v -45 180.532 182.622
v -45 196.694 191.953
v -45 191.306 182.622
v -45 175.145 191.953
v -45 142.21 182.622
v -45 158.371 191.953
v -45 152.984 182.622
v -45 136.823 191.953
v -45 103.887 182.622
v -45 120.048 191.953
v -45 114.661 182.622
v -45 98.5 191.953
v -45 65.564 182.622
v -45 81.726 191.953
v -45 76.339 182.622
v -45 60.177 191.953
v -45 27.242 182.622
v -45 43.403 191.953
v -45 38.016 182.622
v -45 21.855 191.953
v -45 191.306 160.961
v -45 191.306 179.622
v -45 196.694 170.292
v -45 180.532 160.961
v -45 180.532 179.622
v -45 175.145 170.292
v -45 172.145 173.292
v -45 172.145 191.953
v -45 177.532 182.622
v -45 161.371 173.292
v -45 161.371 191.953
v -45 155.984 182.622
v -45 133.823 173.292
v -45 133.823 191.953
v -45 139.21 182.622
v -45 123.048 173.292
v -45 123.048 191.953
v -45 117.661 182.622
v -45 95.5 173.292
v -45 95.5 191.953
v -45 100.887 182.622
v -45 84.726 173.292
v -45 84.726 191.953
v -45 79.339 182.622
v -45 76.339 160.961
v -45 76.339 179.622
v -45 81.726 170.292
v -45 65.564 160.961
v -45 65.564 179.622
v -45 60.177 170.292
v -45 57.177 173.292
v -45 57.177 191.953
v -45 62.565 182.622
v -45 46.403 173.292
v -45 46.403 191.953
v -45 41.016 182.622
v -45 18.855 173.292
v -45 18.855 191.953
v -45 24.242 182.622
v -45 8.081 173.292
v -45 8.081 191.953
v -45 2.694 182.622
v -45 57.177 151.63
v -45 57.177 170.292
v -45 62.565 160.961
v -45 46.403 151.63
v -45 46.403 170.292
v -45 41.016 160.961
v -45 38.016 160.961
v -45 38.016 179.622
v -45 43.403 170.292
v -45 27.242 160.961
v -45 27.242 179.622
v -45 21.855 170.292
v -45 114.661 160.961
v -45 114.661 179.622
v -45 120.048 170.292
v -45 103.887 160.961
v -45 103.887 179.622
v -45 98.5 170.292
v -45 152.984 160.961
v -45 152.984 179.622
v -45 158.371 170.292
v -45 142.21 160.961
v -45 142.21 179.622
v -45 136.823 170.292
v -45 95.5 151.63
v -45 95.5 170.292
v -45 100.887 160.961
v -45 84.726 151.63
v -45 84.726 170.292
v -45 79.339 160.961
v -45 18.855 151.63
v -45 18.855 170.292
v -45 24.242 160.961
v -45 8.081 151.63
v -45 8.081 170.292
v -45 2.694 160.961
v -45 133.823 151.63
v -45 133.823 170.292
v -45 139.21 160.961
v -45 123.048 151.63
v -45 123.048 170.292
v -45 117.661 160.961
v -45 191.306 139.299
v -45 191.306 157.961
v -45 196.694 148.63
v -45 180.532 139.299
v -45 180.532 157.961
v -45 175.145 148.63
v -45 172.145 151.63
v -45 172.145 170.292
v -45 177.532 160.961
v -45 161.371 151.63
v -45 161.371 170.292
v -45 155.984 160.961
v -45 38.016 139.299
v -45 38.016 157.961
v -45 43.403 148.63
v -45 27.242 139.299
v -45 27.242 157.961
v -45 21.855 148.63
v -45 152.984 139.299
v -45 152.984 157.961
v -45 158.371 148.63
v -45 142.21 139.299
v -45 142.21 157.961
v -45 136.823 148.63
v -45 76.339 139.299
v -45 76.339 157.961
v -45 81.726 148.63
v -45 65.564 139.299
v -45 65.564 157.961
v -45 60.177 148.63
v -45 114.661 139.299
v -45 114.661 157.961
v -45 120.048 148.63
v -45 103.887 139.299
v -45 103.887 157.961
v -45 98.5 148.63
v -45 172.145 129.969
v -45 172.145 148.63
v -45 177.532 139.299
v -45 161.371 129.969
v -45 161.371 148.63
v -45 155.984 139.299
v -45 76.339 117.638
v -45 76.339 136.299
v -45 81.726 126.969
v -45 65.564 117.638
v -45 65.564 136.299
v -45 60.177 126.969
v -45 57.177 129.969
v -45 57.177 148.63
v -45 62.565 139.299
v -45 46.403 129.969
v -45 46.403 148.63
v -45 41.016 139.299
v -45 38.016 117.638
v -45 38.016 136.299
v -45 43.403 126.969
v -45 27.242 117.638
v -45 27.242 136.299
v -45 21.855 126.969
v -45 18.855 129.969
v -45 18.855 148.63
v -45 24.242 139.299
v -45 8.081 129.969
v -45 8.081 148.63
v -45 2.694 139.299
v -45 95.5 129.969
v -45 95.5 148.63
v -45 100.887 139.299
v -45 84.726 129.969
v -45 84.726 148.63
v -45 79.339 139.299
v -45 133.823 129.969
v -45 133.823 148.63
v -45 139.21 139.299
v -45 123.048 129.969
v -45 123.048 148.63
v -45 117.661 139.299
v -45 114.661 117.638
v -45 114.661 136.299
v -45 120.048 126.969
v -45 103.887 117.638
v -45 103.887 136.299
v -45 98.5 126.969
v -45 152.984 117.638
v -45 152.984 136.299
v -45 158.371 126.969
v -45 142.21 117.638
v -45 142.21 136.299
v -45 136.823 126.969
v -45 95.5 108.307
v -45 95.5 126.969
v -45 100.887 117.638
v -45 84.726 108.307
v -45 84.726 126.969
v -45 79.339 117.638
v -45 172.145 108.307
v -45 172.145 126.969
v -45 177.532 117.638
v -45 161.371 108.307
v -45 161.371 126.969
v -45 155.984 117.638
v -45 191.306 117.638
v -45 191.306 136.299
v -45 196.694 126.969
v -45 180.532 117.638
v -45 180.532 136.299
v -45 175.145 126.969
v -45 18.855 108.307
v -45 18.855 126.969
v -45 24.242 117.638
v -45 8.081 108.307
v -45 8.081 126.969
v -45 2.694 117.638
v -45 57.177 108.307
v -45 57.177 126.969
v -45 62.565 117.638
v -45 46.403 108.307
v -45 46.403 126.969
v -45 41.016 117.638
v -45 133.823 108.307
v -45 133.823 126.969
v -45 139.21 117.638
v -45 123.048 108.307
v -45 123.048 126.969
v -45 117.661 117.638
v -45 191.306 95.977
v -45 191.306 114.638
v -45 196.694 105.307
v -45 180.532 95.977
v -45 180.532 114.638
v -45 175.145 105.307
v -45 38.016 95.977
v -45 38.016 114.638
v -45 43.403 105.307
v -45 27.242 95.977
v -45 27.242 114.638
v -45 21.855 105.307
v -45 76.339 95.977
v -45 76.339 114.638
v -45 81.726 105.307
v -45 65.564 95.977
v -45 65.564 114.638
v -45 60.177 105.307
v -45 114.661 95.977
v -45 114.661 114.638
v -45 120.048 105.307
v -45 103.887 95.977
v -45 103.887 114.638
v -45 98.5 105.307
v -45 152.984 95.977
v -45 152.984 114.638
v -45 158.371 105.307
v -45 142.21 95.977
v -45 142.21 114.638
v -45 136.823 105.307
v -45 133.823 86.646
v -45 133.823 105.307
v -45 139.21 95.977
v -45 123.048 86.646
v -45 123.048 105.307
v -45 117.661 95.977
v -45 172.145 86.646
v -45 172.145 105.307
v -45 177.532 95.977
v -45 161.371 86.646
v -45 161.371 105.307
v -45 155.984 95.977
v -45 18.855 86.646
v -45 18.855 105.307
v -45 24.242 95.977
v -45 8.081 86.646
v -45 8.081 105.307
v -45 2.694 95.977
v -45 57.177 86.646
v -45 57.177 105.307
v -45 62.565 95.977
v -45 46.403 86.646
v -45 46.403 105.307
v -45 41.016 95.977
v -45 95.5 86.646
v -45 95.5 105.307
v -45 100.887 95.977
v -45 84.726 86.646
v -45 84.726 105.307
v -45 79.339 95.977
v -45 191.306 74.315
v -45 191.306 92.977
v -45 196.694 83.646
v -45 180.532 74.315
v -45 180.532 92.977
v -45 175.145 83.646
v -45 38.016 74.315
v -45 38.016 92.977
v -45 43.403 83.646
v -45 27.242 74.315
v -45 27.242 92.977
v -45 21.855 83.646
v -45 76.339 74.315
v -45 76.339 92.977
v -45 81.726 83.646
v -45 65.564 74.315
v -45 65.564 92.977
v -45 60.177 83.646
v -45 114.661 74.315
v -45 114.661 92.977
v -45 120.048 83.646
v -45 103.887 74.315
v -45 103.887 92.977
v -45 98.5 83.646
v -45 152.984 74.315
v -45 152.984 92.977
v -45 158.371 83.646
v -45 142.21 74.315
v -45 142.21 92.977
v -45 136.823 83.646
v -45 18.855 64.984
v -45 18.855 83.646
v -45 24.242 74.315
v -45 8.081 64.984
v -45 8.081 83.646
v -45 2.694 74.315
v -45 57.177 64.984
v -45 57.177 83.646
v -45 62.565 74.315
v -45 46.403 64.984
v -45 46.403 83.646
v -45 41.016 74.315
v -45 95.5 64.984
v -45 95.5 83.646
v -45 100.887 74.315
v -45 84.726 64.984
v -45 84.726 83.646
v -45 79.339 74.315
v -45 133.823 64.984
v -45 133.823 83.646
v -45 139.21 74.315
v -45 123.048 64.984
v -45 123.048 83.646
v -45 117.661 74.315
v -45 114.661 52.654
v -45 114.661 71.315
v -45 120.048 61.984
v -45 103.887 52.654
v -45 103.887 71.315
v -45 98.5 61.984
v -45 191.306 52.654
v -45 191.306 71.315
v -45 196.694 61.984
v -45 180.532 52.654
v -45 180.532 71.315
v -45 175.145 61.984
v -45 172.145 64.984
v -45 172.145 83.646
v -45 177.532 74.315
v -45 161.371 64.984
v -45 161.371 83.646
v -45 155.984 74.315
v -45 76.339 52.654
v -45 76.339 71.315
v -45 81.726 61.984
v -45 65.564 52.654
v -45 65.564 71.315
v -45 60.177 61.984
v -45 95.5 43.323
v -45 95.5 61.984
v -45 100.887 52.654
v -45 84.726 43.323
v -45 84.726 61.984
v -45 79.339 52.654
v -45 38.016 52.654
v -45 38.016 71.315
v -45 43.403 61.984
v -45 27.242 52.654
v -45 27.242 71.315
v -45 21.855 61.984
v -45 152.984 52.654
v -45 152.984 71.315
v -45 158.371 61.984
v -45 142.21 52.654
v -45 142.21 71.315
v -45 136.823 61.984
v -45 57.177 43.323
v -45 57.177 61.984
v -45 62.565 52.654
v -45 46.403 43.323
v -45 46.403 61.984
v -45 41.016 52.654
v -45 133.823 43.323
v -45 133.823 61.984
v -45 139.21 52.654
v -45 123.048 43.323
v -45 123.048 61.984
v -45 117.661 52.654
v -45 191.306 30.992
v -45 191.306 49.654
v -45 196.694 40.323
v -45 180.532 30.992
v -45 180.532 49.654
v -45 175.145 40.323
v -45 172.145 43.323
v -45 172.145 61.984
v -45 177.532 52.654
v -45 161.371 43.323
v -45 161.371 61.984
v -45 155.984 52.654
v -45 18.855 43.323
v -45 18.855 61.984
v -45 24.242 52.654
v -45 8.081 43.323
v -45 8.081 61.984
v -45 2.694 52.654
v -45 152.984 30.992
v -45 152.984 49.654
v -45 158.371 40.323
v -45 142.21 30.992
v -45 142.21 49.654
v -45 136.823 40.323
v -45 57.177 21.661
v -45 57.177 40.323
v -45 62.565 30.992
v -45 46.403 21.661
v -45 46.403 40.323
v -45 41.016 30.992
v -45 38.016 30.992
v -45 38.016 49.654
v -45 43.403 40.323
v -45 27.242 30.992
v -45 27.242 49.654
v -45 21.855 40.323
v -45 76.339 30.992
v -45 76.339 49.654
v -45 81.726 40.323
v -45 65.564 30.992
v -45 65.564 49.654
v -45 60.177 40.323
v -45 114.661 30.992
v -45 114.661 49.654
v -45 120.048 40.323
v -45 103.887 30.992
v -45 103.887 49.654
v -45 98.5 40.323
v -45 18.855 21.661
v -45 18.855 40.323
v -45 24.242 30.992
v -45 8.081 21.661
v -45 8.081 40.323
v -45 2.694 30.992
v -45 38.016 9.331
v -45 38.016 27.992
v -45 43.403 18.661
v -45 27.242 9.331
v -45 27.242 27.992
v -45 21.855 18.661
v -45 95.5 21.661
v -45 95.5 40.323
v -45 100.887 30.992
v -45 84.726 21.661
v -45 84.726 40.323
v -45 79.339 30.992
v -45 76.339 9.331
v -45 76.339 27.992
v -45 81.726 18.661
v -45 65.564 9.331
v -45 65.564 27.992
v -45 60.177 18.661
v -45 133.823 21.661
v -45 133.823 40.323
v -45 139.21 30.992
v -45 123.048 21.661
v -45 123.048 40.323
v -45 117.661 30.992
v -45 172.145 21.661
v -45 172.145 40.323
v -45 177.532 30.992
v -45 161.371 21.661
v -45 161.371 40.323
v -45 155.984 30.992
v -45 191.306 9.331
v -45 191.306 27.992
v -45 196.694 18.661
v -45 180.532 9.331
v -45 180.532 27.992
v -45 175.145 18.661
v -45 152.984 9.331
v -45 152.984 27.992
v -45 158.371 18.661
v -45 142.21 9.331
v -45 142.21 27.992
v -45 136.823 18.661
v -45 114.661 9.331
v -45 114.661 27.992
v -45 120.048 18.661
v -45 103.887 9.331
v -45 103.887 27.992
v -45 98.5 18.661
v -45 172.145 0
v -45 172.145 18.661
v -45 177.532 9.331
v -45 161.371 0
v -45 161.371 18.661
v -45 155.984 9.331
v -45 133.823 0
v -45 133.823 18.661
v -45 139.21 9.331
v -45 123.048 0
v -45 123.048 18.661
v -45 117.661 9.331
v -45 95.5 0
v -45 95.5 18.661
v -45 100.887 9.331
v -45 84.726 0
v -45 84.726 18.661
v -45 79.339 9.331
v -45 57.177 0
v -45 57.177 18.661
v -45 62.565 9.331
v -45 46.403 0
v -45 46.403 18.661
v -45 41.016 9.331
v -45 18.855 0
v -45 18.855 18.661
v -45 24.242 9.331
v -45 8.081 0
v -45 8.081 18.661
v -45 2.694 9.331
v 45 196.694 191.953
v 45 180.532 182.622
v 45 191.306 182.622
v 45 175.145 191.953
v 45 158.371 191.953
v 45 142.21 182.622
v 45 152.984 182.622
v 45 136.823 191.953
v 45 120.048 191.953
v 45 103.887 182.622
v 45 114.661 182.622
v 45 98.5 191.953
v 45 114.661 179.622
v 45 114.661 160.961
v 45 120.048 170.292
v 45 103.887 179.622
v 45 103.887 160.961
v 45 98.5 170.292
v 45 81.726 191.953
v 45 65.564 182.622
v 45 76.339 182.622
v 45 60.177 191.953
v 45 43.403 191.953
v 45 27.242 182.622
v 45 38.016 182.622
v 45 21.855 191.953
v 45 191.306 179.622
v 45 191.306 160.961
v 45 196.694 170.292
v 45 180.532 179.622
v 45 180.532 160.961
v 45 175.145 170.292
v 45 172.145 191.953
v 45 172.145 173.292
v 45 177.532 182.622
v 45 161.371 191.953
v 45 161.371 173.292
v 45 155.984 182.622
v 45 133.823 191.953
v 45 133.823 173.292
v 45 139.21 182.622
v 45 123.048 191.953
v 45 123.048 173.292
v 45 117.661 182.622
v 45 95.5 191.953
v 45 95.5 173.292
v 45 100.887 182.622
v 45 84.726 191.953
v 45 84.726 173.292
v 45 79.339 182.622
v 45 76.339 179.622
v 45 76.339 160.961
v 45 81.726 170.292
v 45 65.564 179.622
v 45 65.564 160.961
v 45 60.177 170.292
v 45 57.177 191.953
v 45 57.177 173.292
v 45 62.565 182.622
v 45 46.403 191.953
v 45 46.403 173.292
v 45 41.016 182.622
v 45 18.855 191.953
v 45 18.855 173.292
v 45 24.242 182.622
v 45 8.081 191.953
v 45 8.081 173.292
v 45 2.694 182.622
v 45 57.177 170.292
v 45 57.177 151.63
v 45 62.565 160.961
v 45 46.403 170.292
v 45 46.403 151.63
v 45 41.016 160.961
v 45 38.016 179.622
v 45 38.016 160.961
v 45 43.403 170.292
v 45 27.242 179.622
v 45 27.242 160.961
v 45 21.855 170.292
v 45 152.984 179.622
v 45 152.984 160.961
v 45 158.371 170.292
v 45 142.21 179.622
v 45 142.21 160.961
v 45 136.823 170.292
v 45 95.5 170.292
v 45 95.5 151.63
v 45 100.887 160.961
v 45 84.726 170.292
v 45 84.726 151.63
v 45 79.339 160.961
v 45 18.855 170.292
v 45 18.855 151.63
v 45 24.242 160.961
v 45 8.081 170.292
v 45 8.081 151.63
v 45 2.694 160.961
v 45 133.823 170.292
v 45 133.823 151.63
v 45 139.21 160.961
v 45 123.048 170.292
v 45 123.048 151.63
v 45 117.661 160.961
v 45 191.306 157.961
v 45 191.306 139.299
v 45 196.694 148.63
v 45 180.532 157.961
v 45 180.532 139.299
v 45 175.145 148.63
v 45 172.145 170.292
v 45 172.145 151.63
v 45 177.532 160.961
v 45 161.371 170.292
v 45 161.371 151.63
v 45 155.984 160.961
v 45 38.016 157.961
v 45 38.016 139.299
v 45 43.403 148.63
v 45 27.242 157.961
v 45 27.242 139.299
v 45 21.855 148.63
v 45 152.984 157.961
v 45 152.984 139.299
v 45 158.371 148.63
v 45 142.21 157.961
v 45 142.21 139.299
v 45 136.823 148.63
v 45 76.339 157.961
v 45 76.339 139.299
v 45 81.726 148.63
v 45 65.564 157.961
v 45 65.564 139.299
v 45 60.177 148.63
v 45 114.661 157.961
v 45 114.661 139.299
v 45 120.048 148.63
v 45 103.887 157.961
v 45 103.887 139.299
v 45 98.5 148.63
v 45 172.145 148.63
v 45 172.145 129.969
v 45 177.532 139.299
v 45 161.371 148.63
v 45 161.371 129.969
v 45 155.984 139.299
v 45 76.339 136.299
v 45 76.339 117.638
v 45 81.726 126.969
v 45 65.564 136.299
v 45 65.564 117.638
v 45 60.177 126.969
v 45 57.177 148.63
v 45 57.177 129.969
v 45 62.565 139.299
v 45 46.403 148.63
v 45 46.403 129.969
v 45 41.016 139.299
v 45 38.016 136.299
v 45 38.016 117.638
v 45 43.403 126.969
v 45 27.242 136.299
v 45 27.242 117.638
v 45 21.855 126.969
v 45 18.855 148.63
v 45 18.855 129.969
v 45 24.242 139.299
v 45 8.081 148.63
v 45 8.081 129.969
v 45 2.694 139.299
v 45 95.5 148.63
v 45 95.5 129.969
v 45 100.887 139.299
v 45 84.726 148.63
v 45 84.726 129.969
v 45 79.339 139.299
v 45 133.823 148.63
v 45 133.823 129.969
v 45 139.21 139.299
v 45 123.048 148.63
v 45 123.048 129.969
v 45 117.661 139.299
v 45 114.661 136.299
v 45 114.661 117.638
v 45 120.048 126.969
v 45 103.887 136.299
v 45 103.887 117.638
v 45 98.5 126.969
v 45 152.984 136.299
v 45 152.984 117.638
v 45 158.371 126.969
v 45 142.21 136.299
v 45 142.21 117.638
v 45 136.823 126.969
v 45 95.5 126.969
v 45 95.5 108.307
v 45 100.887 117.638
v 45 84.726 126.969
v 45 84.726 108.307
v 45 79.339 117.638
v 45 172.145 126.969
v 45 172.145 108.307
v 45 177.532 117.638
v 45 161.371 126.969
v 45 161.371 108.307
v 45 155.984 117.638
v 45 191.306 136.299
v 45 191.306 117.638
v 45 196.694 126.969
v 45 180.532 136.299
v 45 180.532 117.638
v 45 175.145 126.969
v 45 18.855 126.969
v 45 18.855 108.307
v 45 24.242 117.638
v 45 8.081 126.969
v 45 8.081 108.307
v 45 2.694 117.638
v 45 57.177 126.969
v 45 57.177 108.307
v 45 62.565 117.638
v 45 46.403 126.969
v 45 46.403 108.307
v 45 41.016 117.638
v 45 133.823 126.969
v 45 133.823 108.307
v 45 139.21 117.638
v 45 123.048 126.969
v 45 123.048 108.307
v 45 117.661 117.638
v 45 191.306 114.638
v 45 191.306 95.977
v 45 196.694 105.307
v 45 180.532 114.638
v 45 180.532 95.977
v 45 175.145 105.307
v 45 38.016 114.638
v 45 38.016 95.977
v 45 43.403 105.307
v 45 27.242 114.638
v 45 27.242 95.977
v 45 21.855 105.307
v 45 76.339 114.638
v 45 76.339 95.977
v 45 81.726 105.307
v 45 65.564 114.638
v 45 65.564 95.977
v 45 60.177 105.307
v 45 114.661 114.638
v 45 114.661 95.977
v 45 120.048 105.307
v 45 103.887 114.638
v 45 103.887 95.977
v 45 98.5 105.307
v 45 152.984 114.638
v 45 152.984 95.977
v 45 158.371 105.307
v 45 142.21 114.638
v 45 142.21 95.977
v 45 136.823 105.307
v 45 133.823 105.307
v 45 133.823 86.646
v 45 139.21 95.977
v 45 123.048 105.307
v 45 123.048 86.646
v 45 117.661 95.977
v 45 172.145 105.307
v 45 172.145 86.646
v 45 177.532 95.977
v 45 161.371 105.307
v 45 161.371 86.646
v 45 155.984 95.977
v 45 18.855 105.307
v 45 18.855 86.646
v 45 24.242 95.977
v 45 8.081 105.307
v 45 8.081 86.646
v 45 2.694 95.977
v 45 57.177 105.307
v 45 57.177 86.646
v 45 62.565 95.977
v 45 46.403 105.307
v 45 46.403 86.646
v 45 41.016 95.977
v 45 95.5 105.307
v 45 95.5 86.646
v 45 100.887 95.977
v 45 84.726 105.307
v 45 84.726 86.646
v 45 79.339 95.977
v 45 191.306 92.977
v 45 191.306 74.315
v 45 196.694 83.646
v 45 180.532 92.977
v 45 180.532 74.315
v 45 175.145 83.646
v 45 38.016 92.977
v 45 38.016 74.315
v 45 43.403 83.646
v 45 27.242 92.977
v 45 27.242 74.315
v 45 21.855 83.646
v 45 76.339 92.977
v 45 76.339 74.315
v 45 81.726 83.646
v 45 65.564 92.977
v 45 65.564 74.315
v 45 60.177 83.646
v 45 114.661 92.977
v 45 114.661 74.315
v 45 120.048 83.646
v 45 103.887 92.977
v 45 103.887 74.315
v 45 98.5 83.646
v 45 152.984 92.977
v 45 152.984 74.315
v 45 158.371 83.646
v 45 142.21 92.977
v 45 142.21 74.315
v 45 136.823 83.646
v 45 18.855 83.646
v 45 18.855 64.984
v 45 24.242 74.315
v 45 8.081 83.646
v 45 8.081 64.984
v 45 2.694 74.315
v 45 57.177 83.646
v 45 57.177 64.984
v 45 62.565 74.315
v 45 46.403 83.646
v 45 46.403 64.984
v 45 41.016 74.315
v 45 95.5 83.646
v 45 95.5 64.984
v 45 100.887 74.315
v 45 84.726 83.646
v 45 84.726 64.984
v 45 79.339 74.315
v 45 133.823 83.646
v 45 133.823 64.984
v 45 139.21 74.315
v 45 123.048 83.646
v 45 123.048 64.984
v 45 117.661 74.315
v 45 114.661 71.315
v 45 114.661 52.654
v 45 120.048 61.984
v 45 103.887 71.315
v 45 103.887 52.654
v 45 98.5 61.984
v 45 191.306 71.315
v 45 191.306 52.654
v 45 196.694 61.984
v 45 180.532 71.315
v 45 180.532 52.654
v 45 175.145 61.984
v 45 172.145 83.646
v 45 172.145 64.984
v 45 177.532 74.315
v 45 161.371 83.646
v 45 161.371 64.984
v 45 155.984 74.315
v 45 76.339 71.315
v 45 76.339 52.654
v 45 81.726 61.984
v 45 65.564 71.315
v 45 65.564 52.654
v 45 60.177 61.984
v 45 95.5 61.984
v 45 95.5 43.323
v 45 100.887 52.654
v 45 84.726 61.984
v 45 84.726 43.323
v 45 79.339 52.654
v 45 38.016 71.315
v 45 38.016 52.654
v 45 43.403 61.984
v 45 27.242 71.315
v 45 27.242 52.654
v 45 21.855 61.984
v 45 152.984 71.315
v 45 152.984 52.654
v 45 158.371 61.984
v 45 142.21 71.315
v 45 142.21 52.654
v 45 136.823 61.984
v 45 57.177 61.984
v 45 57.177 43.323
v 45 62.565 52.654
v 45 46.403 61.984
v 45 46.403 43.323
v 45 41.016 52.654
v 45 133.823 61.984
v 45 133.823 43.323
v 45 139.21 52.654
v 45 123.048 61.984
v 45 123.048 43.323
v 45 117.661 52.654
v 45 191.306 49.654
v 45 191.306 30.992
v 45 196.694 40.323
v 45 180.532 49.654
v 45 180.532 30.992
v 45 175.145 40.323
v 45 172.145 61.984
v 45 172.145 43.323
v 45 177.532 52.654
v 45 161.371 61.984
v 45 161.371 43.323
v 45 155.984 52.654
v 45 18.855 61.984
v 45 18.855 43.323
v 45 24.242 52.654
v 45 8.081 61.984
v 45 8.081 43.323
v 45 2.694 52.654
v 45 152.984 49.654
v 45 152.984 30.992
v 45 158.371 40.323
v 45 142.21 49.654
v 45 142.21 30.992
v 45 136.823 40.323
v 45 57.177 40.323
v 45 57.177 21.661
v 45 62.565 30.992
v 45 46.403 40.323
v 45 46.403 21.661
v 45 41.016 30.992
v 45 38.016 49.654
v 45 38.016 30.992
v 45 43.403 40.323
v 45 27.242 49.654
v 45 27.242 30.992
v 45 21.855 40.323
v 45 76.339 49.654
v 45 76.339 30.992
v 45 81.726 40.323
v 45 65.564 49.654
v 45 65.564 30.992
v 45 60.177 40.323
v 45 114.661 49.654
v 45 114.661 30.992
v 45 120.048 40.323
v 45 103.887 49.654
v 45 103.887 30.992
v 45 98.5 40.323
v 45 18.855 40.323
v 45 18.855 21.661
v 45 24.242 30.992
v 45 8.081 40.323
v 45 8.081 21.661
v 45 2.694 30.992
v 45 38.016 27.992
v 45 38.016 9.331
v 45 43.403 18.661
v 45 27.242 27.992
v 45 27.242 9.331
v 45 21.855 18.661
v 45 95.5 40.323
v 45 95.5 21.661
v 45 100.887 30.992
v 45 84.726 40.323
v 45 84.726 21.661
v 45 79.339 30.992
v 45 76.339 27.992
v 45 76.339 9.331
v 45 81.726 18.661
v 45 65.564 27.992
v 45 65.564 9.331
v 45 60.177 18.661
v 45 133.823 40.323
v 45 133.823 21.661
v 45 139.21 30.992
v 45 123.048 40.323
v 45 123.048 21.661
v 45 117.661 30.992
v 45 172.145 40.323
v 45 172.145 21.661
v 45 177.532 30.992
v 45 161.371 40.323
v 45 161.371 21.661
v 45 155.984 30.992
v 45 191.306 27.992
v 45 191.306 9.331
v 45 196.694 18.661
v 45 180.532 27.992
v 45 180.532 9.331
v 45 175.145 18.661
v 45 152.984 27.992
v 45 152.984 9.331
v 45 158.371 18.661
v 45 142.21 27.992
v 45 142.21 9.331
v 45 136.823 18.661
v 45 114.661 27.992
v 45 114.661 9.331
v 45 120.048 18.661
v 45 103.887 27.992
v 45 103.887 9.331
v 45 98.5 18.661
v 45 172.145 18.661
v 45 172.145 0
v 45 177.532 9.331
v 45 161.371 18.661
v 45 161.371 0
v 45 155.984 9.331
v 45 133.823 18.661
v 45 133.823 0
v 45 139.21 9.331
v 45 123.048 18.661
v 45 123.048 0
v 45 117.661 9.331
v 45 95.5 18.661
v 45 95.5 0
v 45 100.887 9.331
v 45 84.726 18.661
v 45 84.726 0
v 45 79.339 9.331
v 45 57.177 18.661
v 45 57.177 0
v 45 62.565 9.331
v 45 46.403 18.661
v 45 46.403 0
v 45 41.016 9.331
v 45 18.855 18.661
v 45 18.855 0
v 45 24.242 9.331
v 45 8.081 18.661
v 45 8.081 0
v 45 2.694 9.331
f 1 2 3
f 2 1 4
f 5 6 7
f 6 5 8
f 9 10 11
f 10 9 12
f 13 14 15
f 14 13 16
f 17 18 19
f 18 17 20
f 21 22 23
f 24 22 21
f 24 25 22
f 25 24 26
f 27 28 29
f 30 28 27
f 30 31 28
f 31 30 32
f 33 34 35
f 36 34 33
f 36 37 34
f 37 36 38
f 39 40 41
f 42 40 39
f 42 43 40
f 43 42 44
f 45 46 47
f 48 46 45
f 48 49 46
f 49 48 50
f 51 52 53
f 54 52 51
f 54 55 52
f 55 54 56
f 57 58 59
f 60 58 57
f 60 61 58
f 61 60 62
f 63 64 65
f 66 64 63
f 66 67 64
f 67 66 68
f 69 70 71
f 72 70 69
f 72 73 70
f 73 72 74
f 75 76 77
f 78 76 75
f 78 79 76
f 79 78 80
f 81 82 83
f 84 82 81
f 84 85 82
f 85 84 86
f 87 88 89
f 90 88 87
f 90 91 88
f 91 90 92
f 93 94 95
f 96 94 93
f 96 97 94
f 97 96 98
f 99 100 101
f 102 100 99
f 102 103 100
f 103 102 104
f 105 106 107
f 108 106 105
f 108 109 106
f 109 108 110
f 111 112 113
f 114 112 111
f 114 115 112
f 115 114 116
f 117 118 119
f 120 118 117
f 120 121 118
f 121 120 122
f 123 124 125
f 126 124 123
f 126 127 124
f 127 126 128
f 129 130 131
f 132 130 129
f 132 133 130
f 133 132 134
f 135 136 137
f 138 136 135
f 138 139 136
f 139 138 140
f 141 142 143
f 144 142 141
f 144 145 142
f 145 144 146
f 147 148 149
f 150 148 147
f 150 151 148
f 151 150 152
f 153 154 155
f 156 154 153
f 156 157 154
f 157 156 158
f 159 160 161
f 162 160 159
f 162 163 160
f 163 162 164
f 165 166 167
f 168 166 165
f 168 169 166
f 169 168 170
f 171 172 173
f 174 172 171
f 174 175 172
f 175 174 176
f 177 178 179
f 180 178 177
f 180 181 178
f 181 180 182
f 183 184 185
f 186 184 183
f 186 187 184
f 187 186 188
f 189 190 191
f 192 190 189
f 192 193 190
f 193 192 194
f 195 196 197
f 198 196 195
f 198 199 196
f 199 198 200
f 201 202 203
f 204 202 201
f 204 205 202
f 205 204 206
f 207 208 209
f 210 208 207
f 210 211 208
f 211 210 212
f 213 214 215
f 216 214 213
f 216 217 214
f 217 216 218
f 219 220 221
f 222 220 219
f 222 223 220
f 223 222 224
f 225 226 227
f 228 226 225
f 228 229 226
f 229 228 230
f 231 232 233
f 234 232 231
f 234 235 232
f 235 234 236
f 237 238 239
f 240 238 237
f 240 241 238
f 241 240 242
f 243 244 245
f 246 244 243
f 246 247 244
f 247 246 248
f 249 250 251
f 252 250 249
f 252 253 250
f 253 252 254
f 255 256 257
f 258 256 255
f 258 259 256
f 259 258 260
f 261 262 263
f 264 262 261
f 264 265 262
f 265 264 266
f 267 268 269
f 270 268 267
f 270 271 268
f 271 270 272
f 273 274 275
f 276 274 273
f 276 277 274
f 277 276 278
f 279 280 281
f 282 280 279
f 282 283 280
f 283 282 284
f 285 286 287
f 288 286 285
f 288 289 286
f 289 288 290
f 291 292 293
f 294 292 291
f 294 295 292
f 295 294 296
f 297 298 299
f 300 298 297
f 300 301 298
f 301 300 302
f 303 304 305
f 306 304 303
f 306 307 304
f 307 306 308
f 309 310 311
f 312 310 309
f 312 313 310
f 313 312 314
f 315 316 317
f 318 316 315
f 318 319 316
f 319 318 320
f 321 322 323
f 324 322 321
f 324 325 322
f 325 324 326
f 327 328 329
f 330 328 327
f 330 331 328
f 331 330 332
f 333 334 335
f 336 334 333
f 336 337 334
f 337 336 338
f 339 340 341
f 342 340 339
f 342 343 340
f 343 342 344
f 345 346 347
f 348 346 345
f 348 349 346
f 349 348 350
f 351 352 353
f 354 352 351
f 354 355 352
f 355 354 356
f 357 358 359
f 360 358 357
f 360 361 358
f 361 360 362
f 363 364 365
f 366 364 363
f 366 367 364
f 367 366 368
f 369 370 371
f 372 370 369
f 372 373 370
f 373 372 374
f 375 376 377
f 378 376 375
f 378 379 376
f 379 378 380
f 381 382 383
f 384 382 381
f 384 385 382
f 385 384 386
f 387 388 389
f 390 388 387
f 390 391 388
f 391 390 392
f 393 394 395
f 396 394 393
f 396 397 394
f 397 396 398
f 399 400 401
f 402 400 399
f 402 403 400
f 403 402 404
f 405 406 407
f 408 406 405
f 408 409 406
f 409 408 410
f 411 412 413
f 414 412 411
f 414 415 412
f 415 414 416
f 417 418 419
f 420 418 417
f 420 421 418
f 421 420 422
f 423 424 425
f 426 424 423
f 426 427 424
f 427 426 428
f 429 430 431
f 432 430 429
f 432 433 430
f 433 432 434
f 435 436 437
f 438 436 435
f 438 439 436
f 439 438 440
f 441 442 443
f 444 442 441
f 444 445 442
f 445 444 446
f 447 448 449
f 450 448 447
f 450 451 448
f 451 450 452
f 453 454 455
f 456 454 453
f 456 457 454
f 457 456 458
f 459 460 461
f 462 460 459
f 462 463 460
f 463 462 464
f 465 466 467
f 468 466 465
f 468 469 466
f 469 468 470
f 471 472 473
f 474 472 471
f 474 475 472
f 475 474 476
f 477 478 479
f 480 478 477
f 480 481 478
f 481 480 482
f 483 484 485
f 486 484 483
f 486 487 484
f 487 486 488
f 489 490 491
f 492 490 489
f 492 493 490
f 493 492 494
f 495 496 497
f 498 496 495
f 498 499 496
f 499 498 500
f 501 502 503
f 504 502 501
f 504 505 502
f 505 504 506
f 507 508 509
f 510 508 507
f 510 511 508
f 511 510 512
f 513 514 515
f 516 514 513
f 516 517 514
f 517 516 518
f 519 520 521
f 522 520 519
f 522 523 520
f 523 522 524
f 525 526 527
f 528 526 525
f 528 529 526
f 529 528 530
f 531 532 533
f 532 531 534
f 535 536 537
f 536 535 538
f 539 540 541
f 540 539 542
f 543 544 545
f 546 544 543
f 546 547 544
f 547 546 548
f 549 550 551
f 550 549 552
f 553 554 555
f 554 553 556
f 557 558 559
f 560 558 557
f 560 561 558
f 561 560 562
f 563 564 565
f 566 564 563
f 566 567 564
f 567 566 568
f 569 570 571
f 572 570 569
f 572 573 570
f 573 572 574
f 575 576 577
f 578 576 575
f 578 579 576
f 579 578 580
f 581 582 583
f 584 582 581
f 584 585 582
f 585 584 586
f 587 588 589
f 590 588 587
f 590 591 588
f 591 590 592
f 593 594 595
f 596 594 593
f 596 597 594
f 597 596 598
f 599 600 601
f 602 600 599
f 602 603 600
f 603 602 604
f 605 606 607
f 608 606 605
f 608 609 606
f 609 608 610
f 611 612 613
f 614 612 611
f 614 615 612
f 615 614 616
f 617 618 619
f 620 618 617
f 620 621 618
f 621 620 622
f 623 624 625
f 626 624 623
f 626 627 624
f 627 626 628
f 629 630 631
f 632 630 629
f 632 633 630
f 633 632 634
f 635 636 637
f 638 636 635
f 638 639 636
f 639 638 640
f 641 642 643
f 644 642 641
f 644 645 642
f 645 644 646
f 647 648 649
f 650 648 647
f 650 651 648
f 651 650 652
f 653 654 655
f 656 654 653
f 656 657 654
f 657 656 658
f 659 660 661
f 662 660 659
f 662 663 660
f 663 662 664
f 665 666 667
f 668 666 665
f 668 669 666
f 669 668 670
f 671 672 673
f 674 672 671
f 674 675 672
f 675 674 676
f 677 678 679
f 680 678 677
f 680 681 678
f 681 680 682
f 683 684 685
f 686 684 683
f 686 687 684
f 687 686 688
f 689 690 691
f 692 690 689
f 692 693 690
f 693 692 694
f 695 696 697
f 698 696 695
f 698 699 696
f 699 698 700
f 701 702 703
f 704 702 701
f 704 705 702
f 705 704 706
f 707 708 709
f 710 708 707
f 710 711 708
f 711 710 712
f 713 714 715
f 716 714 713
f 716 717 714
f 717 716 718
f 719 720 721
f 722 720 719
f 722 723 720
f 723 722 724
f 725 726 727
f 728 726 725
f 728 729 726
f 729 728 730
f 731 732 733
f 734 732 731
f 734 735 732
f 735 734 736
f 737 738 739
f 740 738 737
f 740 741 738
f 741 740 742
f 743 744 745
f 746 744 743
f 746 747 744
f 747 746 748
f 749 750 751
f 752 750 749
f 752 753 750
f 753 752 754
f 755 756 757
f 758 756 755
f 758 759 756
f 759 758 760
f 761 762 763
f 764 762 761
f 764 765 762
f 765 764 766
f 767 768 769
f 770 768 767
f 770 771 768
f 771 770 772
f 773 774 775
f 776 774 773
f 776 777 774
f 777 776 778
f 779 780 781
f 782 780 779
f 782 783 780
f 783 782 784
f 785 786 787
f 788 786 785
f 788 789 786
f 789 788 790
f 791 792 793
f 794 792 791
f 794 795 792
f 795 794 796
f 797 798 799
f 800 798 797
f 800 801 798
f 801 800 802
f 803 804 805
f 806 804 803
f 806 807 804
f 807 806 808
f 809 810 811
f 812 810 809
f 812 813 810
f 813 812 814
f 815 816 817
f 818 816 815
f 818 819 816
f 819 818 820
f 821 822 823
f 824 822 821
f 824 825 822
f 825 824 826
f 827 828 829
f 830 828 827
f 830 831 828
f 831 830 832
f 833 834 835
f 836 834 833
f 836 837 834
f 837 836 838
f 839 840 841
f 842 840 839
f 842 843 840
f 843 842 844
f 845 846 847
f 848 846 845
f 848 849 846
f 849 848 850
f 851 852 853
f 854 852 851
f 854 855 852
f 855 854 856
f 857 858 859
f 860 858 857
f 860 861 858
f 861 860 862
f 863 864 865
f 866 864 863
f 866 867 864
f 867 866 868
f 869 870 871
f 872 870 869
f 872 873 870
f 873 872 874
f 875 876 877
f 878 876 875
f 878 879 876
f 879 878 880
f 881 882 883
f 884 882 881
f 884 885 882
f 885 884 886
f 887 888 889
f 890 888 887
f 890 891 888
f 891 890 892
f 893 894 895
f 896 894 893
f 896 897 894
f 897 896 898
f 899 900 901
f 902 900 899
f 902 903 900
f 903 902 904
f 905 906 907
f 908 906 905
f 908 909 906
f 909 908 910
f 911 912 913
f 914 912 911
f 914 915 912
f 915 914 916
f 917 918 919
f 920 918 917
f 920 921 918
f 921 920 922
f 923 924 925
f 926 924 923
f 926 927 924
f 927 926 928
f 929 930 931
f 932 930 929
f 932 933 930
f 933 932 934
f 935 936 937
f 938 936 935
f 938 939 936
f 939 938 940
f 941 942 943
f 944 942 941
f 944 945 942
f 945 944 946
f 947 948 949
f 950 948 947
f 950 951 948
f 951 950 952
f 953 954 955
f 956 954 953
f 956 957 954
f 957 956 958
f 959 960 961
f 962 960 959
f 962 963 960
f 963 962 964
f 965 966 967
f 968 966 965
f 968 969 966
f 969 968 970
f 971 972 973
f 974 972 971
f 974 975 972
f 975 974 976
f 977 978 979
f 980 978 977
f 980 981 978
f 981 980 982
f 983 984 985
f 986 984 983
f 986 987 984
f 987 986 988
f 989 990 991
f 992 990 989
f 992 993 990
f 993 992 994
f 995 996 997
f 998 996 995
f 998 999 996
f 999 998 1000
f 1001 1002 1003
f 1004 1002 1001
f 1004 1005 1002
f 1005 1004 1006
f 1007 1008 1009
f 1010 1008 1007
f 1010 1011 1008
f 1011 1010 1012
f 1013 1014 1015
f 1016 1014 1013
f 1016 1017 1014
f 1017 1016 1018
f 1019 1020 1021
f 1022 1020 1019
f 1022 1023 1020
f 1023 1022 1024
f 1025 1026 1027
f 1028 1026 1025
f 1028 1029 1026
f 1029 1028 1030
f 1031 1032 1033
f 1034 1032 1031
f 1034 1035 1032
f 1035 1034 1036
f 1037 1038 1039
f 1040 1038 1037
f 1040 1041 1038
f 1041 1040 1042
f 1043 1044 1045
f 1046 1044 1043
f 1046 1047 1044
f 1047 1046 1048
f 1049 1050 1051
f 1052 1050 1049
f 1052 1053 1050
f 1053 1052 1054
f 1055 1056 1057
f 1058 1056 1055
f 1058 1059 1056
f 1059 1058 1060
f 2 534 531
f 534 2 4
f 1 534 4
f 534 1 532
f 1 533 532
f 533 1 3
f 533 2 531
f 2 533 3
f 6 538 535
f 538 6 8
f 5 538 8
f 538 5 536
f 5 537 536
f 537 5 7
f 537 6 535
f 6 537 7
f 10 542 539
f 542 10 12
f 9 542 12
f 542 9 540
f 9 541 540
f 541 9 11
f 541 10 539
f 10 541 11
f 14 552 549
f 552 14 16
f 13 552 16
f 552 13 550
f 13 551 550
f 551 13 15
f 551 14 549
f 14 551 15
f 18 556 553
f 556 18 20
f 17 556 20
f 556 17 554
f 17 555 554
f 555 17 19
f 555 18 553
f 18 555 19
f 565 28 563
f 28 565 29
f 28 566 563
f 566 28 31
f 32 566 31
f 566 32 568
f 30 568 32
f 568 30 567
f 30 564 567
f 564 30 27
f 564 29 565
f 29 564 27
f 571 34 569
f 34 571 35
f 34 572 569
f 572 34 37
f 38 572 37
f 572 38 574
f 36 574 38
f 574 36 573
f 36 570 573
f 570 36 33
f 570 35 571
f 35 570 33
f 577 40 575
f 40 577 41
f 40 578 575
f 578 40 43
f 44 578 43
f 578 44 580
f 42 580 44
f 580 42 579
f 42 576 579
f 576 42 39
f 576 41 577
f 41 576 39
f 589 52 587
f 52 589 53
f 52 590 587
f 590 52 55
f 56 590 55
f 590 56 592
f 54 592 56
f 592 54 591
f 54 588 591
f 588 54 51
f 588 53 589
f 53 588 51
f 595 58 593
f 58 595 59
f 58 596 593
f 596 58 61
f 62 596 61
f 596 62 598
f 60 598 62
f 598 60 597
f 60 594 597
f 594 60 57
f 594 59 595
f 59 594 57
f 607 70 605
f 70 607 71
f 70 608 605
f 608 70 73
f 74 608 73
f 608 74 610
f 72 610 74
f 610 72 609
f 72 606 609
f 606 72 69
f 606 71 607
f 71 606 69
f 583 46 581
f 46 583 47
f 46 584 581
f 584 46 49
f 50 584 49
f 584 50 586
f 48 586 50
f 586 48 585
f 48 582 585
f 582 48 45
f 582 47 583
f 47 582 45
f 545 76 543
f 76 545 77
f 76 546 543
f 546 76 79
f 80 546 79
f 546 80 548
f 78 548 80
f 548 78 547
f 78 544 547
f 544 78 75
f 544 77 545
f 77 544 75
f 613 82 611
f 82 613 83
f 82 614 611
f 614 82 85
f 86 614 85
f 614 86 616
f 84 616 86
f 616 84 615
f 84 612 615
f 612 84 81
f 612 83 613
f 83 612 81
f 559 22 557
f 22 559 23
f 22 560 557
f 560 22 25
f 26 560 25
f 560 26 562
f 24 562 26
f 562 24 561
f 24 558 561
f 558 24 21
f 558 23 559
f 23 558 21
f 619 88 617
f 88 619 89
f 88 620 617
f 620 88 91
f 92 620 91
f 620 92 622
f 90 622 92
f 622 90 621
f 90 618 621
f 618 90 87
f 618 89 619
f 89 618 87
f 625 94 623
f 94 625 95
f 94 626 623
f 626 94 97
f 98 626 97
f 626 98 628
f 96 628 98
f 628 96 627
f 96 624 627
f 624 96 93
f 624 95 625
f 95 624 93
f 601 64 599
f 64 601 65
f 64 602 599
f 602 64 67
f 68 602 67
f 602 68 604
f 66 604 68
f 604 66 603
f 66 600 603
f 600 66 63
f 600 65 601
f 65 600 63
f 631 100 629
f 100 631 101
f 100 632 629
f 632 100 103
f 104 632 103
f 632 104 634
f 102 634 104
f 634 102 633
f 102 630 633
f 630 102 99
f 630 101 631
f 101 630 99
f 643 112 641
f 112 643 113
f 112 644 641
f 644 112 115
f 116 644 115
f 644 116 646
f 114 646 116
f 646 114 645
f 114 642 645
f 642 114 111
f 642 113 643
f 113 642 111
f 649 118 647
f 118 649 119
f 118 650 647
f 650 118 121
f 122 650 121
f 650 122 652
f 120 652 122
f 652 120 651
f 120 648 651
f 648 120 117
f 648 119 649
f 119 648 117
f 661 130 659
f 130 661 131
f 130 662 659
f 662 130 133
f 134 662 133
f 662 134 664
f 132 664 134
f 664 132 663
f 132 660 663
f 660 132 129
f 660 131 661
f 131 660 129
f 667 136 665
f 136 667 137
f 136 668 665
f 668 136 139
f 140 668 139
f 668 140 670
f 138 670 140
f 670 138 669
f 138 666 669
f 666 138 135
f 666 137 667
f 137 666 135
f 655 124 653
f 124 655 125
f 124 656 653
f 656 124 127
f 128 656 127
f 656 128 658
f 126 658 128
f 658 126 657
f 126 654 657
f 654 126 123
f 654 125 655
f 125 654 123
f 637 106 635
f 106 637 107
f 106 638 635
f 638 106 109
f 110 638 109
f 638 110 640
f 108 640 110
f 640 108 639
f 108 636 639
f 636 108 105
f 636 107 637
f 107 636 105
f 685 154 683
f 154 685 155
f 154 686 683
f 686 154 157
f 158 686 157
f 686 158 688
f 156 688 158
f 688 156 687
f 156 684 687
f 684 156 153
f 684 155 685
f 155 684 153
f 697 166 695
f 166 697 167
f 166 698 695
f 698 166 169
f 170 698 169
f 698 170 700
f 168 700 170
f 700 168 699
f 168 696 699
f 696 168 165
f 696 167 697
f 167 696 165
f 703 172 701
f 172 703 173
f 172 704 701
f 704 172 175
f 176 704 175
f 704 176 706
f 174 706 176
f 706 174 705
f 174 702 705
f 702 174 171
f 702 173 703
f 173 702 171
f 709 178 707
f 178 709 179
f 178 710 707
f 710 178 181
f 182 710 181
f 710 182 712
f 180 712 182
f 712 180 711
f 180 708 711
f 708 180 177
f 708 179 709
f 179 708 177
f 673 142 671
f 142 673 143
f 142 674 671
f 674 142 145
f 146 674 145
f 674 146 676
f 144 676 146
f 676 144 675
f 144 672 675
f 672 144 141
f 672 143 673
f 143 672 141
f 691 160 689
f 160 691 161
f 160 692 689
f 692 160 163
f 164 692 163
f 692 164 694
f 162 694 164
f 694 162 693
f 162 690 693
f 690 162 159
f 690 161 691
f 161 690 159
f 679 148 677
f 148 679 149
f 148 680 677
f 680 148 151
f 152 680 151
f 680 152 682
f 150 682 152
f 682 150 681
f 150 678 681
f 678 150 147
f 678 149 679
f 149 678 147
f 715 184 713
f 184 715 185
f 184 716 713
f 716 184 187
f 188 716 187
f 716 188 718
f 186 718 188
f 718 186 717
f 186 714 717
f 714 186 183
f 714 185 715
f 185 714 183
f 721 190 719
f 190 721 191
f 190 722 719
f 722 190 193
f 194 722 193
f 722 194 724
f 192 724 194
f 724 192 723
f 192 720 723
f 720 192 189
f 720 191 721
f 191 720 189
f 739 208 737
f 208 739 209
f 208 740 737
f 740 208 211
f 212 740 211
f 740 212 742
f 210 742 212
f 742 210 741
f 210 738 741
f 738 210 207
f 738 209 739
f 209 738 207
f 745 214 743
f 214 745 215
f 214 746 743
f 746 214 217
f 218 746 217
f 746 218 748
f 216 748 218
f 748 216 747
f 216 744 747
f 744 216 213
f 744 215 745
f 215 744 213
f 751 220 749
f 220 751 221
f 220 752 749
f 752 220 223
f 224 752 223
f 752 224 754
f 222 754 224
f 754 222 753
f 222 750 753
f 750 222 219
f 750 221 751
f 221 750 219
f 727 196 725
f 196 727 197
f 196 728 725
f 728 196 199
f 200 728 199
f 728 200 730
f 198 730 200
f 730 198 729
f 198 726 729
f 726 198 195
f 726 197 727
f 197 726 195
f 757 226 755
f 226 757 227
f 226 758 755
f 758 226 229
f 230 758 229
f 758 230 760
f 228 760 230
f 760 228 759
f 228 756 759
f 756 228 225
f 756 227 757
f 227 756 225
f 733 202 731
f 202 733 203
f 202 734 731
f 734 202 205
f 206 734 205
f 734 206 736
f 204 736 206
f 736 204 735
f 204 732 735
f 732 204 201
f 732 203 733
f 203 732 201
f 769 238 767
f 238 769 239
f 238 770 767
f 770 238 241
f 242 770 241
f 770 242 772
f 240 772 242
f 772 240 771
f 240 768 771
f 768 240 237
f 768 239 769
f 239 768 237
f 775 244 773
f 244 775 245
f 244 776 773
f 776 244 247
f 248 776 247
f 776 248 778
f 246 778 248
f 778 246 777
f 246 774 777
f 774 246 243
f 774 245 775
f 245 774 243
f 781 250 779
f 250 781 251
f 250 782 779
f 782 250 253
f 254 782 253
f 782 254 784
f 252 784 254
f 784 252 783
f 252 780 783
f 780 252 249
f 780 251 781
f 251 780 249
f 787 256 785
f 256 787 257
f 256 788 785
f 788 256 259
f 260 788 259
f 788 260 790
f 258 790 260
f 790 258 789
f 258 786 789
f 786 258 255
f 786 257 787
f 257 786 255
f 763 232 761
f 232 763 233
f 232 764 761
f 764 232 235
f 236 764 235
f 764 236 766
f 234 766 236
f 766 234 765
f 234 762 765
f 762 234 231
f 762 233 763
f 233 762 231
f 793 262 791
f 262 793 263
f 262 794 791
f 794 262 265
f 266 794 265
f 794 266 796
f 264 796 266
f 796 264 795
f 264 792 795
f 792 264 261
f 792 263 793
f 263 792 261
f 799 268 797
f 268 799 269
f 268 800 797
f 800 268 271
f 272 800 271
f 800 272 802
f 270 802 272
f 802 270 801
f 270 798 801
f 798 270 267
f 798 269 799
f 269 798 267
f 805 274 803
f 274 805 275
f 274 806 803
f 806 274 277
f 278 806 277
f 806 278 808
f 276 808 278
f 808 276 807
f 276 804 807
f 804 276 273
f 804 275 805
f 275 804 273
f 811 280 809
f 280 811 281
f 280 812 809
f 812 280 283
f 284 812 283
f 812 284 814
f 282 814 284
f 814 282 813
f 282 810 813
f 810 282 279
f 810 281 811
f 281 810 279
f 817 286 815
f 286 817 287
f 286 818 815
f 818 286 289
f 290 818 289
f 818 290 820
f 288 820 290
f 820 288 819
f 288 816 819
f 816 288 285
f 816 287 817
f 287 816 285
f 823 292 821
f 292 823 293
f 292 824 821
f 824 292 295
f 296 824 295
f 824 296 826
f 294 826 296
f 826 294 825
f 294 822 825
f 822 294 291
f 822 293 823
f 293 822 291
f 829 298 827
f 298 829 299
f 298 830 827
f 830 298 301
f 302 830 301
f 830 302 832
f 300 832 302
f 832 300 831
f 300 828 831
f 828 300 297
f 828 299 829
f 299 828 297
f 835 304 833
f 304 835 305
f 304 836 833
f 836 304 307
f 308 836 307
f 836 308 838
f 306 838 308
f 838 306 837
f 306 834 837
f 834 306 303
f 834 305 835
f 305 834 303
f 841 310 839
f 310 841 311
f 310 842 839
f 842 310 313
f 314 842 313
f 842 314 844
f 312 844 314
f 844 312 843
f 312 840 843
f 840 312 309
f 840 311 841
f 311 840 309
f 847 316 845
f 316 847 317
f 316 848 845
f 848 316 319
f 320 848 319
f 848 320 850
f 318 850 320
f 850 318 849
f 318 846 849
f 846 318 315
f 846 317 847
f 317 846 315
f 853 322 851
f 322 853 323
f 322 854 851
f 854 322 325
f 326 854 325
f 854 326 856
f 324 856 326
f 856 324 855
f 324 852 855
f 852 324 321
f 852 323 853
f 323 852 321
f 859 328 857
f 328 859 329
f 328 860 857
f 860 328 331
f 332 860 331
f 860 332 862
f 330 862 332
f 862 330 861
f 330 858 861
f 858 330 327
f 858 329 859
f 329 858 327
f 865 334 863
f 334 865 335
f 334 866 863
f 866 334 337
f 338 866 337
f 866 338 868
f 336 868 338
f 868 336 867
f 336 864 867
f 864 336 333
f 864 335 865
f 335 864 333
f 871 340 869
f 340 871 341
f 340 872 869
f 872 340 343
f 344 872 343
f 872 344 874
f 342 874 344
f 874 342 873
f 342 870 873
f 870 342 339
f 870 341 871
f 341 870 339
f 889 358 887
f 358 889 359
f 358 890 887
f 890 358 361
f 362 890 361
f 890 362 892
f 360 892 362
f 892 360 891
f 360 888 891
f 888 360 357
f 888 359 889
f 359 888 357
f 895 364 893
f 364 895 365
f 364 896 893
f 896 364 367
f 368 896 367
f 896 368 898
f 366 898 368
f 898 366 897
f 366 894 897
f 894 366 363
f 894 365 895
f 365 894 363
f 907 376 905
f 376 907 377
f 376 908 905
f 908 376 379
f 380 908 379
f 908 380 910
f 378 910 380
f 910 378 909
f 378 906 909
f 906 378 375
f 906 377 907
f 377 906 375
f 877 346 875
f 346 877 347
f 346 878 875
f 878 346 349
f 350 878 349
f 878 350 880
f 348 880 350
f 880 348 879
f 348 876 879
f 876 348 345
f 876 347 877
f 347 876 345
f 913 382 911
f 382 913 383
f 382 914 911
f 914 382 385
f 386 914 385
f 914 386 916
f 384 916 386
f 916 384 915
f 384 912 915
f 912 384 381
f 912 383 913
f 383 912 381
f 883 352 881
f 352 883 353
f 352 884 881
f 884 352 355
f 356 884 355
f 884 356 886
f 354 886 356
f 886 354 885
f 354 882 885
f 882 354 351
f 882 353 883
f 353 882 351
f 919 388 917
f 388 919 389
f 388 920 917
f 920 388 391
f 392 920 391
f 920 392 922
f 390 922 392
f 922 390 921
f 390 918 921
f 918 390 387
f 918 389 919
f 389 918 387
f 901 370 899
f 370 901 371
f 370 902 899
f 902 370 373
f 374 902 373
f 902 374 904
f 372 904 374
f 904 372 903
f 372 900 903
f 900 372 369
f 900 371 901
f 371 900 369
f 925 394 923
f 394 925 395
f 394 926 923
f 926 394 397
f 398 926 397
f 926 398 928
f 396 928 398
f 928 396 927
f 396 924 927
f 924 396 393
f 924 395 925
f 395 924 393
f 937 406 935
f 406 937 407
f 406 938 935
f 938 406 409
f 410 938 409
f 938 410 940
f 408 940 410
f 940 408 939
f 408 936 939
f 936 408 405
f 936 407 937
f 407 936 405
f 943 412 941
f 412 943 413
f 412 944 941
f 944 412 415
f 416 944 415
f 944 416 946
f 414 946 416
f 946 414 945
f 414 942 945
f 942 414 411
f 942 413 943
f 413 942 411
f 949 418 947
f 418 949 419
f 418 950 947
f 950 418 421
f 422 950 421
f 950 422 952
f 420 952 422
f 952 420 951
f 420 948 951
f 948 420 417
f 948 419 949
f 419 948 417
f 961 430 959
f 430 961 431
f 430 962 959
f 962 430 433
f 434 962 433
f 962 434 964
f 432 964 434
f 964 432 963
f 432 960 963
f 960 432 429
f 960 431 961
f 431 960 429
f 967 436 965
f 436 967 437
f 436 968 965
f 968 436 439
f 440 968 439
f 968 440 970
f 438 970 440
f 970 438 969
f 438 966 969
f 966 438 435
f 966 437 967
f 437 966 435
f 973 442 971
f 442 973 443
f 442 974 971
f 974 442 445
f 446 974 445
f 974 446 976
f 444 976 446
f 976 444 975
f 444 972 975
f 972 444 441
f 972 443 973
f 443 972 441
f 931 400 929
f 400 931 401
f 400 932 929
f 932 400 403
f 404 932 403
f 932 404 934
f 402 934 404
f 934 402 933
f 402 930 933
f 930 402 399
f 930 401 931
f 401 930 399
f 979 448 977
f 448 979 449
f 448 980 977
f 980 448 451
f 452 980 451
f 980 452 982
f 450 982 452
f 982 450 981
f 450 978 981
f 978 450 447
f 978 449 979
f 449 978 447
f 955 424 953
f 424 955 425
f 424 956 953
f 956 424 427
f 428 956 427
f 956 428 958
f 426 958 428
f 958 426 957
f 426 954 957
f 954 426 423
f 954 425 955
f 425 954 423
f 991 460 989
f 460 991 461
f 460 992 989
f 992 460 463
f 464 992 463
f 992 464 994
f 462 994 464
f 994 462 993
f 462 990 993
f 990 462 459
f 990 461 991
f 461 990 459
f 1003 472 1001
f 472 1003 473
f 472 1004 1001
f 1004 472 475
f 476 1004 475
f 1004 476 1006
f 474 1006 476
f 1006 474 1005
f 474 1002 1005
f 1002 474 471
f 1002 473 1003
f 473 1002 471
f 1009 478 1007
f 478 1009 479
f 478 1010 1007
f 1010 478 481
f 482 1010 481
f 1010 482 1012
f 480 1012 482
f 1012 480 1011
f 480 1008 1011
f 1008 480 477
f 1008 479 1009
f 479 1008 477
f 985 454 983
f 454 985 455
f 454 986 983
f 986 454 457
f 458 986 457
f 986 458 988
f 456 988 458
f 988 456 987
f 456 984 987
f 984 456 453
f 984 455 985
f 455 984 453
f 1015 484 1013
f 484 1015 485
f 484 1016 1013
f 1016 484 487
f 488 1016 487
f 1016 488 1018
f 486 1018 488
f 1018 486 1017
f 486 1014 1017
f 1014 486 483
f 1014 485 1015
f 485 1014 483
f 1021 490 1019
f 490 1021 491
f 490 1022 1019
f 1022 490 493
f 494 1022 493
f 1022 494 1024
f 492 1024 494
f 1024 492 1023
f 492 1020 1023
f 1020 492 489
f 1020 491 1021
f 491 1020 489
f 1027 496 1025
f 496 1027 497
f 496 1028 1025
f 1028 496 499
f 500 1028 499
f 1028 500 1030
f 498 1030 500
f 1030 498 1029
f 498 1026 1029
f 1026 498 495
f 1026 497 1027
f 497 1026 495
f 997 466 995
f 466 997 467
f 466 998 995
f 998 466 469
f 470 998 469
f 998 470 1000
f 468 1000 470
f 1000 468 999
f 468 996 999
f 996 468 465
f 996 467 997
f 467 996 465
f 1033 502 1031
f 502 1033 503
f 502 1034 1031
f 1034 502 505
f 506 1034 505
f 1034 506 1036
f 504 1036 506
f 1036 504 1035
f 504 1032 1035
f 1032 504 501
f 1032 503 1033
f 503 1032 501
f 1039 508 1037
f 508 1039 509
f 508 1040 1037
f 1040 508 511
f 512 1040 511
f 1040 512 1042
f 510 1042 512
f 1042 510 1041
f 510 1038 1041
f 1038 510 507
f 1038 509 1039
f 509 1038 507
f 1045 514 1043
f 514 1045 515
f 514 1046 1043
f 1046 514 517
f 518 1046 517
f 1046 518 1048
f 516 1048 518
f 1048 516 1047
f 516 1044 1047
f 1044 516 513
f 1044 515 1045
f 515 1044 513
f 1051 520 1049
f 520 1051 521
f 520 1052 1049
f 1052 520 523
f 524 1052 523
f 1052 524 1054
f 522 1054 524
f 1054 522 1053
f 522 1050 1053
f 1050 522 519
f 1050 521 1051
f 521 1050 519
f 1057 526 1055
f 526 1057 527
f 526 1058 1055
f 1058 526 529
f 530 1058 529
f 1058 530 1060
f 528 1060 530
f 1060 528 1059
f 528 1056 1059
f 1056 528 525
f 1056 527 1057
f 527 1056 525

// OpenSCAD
 height = 200;
 width = 200;
 holes = 10;
 spacing =3;
 angle = 0;
 wall_thickness = 30;
 point_up = false;

testwidth = 1;
//translate( [width/2,0,0]) cube([testwidth,3*height, 3*wall_thickness], center = true);

hexvollwand(width = width,  h=height, num_holes=holes, angle=angle, w= wall_thickness, spacing = spacing, point_up = point_up );
//    translate([width,0,0])
//      color("red")
//    rotate([0,180,0])
//    hexwand(width = width, with_holes=true, h=height, num_holes=holes , angle=angle, w= wall_thickness, point = point_up);

//translate([0,0,0])
//  hexwand(width = width, with_holes=false, h=height, num_holes=holes , angle=angle, w= wall_thickness, spacing= spacing, center=true, point=point_up);
  //cube([wall_thickness,width, height]);

rad = point_up? (width-(holes-1)*spacing)/(2*holes*cos(30)): (width-(holes-1)*spacing)/(2+3/2*(holes-1));
//hexagon(radius = rad, point_up = false, center = [false,false,true], xoff= 0,yoff=0, half=1);
 //hexagon_pattern(width = width, height = height, num_cols = holes, spacing = spacing, point_up = point_up);
 //translate([width,0,2])
 //rotate([0,180,0])
 //hexagon_pattern(width = width, height = height, num_cols = holes, spacing = spacing, point_up = point_up);

// for (i = [0:5]){
//   w = (i * 60 + (point_up ? 30 : 0));
//   rotate([0,0,w])
//   translate([10,0,0]) text(str(i));
// }

module hexwand(width = 10, with_holes=false, h=10, w=2, num_holes= 5, angle=0, spacing = 1, point=false, center=false)
{
  if(with_holes)
  {
    hexlochwand(width = width, height=h, w=w, num_holes= num_holes, angle=angle, spacing=spacing, point_up= point);
  }
  else
  {
    hexvollwand(width = width, h=h, w=w, num_holes= num_holes, angle=angle, center = center, spacing=spacing, point_up= point);
  }
}
module hexvollwand(width = 10, h=10, w=2, num_holes= 5, angle=0, spacing = 1, point_up=false, center= false)
{
  ver_sh = (num_holes >0)?h:h-2*w;
  ver_sp = h+3*w;
  d_ver = 2*w*tan(30);

  wand_poly_points = [
    [0,0,0], [0,width,0], [w,width,0], [w,0,0], //Grund fläche 0 1 2 3

    [ver_sh*sin(angle),-ver_sh*sin(angle),ver_sh], //Start verjüngung 4
    [ver_sh*sin(angle),width+ver_sh*sin(angle),ver_sh],  // 5
    [w+ver_sh*sin(angle),width+ver_sh*sin(angle),ver_sh], /// 6
    [w+ver_sh*sin(angle),-ver_sh*sin(angle),ver_sh], //Ende verjüngung 7 

    if(num_holes <=0)[h*sin(angle),-h*sin(angle),h], //wandhöhe 8
    if(num_holes <=0)[h*sin(angle),width+h*sin(angle),h],  // 9
    if(num_holes <=0)[w+h*sin(angle),width+h*sin(angle),h],  // 12
    if(num_holes <=0)[w+h*sin(angle),-h*sin(angle),h], //wandhöhe 13
    if(num_holes <=0)[w+h*sin(angle)+d_ver,width+h*sin(angle),h],  //10
    if(num_holes <=0)[w+h*sin(angle)+d_ver,-h*sin(angle),h], //11

    if(num_holes <=0)[w+ver_sp*sin(angle),-ver_sp*sin(angle),ver_sp], 
    if(num_holes <=0)[w+ver_sp*sin(angle),width+ver_sp*sin(angle),ver_sp], 
    if(num_holes <=0)[2*w+ver_sp*sin(angle),width+ver_sp*sin(angle),ver_sp], 
    if(num_holes <=0)[2*w+ver_sp*sin(angle),-ver_sp*sin(angle),ver_sp], //Start verjüngung 
    ];

  wand_poly_faces = [
    [0,3,2,1], //Grundfläche
    [0,1,5,4], //front
    [1,2,6,5],  //Seite rechts
    [2,3,7,6], //hinten
    [3,0,4,7],  //Seite links
		//-------------  wandhöhe
    if(num_holes <=0) [4,5,9,8], //front
				 //[5,6,10,9],  //Seite rechts komplett
    if(num_holes <=0)[5,6,12,10],  //Seite rechts
    if(num_holes <=0)[5,10,9],  //Seite rechts
    if(num_holes <=0)[6,7,13,12], //hinten
    if(num_holes <=0)//[7,4,8,11],  //Seite links komplett
      if(num_holes <=0)[7,4,11,13],  //Seite links
    if(num_holes <=0)[4,8,11],  //Seite links dreieck
    (num_holes <=0)?[8,9,10,11]:[4,7,6,5], //Abschluss Wandhöhe
					   //[8,9,10,11], //Abschluss Wandhöhe
					   //-------------  Überlaufhöhe
    if(num_holes <=0)[11,10,15,14], //front
    if(num_holes <=0)[10,12,16,15],  //Seite rechts
    if(num_holes <=0)[12,13,17,16], //hinten
    if(num_holes <=0)[11,14,17,13],  //Seite links
    if(num_holes <=0)[14,15,16,17], //Abschluss Überlaufhöhe
    ];
  //color("green")
  //difference()
  {
    translate([0,center?-0.5*width:0,0])
      polyhedron(points=wand_poly_points, faces=wand_poly_faces);
     if(num_holes >0)
     {
         rotate([0,angle,0])
         rotate([90,0,90])
         linear_extrude(height = 3*w, center = true)
         hexagon_pattern(width = width, height = h, num_cols = num_holes, spacing = spacing, point_up = point_up);
     }
  }

}



module hexlochwand_notworking(width = 10, h = 10, w = 2, num_holes = 10, angle = 0, spacing = 1) {
  lochr = (width - spacing * (num_holes - 1)) / num_holes; // Adjust the calculation for hole radius with spacing and wall thickness
  offx = lochr + spacing;
  numy = ceil(h / offx);
  total_width = num_holes * offx - spacing; // Adjust total width with spacing
  centering = (width - total_width) / 2;

  rotate([0, angle, 0])
    rotate([90, 0, 90])
    //linear_extrude(height = w)
    difference() {
      //if (angle == 0) square([width, h]);
      //else polygon([[0, 0], [width, 0], [width + h * tan(angle), h], [-h * tan(angle), h]]);
      union() {
	rotate([90,0,90])
	  hexagon_pattern(width = width, height = h, spacing = spacing);
      }
    }
}


module hexlochwand(width = 10, height = 10, w = 2, num_holes = 10, angle = 0, spacing = 1, point_up = false) 
{
  radius = ((width-(num_holes+1)*spacing)/num_holes)/2;
  hexr = radius*cos(30);
  num_rows = point_up? 2*floor((height / (2 * radius + spacing))/2)+1
    :2*floor((height / (2 * radius * cos(30) + spacing))/2)+1;

  hexgrid_width = let( pairs = floor(num_holes/2), impairs = num_holes - 2*pairs, hexcount = 3*pairs+2*impairs)
    //echo("total count of radii ",hexcount,pairs,impairs)
    point_up?
    num_holes*(2*(hexr+spacing))-1*(radius-hexr)
    :
    (num_holes == 1)?2*radius:
    hexcount*(radius+spacing) ;
  //echo("width ", width, " vs ",num_holes," x ",radius," + ", spacing," = ",hexgrid_width);

  xoff = (width-hexgrid_width)/2;
  //color("magenta")
  //  square([2*((num_holes)*(radius+spacing)),num_rows*(2 * radius * cos(30) + spacing)]);

  linear_extrude(height=w)
    difference()
    {
      if (angle == 0) square([width, height]);
      else polygon([[0, 0], [width, 0], [width + height * tan(angle), height], [-height * tan(angle), height]]);


      for (row = [0:num_rows - 1]) {
	let (oddrow = row % 2 == 1)
	  for (col = [0:num_holes - 1]) {
	    oddcol = col % 2 == 1;
	    yoff = point_up? radius -radius * cos(30)
	      :(oddcol?radius * cos(30):0 );
	    xpos = point_up? 
	      oddrow?col *( 2*hexr + 2*spacing)-( hexr)
	      :col *(2*hexr + 2*spacing)
	      :oddcol?col *( radius+radius*sin(30) + 2*spacing):col/2 *(3*radius+4*spacing);
	    x = point_up?
	      xpos+radius+xoff
	      :xpos+radius+xoff;
	    y = point_up?row * (2 * hexr+spacing )+ (hexr)+yoff:row * (2 * hexr+spacing )+ (hexr)+yoff;
	    if(x-(point_up?hexr:0)> spacing)
	      translate([x, y, 0])
	      color(oddrow?"red":oddcol?"blue":"yellow")
	      hexagon(radius= radius, point_up = point_up);
	  }
      }
    }
}





function hexagon_points(radius = 1, point_up = true, z= -1, pos = [0,1,2], xoff = 0, yoff=0, center = [true,true,true], half = 0)= 
    let(
	angles = [ for (i = [0:5]) (i * 60 + (point_up ? 30 : 0)) ], 
	xoff=xoff+(center[0]?0:point_up?(half==1? 0:radius*cos(30)):radius),  
	yoff = yoff+ (center[1]?0:point_up?radius:(half==1?0:radius*cos(30))) )
    [
        for (w = angles)
          let(
	      rawx=radius * cos(w),rawy=radius * sin(w), 
	      x = point_up? (half == -1?(rawx <=0?rawx:0) : half == 1?(rawx >=0?rawx:0):rawx):rawx ,
	      y = point_up? rawy : (half == -1?(rawy <=0?rawy:0) : half == 1?(rawy >=0?rawy:0):rawy),
	      result = [x+xoff, y+yoff, if(z>=0) z]
	      ) 
  [
     pos[0]== 0?result.x:pos[0]== 1?result.y:result.z,
     pos[1]== 0?result.x:pos[1]== 1?result.y:result.z,
     if(z >=0) pos[2]== 0?result.x:pos[2]== 1?result.y:result.z,
	]
    ];



module hexagon(radius = 1, point_up = true, center = [true,true,true], xoff = 0, yoff=0, half=0) {
    angles = [
        for (i = [0:5]) (i * 60 + (point_up ? 30 : 0))
    ];
    //yoff = point_up ? yoff: yoff+radius * sin(30);
    points = hexagon_points(radius = radius, point_up = point_up, center = center, xoff=xoff, yoff=yoff, half=half);
    //translate([center[0]?0:point_up?radius*cos(30):radius,center[1]?0:point_up?radius:0,0])
    polygon(points = points);
}


module hexagon_pattern(width = 10, height = 10, num_cols = 5, spacing = 1, point_up = false) 
{
  radius = point_up? (width-(num_cols+1)*spacing)/(2*num_cols*cos(30)):   (width-(num_cols+1)*spacing)/(2+(num_cols-1)*(1+sin(30)));
  hexr = radius*cos(30);
  //assert(point_up?(2*hexr+spacing)*num_cols < width:(2*radius+spacing)*num_cols < width);
 
  num_rows = point_up? (height+spacing) / (3 * radius/2 + spacing)
    :2*floor((height / (2 * radius * cos(30) + spacing))/2)+1;

  hexgrid_width = let( pairs = floor(num_cols/2), impairs = num_cols - 2*pairs, hexcount = 2*pairs+1*impairs)
    //echo("##### count : ",hexcount, " vs ",num_cols,"p",pairs,"i",impairs," width",(pairs*2*radius+ impairs*radius+ num_cols*spacing))
    point_up?  num_cols*(2*hexr+spacing)-spacing
    :
    pairs*(3*radius+2*spacing)+ impairs*radius+spacing ;

  xoff = point_up?((width-hexgrid_width)/2): (width-hexgrid_width)/2;

      for (row = [0:num_rows - 1]) {
	let (oddrow = row % 2 == 1)
	  for (col = [0:point_up?(oddrow? num_cols:num_cols - 1): num_cols - 1]) {
	    oddcol = col % 2 == 1;
	    yoff = point_up? 0
	      :(oddcol?radius * cos(30):0 );
	    xpos = point_up? 
	      oddrow?col *( 2*hexr + spacing)-( hexr)
	      :col *(2*hexr + spacing)
	      :oddcol?col *( radius+radius*sin(30) + 1*spacing):col/2 *(3*radius+2*spacing);
	    x = point_up?
	      (oddrow? xpos+xoff-spacing/2:xpos+xoff)
	      :xpos+xoff;
	    y = point_up?row * (radius*3/2+spacing )+yoff:row * (2 * hexr+spacing )+ yoff;

	    difference()
	    {
	      translate([point_up?((oddrow && col == 0)?(hexr+x):x):x, y, 0])
	      color(oddrow?"red":oddcol?"blue":"yellow")
	      hexagon(radius= radius, point_up = point_up, center = [false,false,true], half=point_up?((oddrow && col == 0)?1:(oddrow && col == num_cols )?-1:0): (y+2*radius>height)?-1:0  );
	      union()
	      {
	      if(x<0)translate( [-radius+spacing,y-1,0]) square([radius,2*radius+2]);
	      if(x+hexr>width-spacing)translate( [width-spacing,y-1,0]) square([10*radius,2*radius+2]);
	      }
	    }
      }
    }
}
